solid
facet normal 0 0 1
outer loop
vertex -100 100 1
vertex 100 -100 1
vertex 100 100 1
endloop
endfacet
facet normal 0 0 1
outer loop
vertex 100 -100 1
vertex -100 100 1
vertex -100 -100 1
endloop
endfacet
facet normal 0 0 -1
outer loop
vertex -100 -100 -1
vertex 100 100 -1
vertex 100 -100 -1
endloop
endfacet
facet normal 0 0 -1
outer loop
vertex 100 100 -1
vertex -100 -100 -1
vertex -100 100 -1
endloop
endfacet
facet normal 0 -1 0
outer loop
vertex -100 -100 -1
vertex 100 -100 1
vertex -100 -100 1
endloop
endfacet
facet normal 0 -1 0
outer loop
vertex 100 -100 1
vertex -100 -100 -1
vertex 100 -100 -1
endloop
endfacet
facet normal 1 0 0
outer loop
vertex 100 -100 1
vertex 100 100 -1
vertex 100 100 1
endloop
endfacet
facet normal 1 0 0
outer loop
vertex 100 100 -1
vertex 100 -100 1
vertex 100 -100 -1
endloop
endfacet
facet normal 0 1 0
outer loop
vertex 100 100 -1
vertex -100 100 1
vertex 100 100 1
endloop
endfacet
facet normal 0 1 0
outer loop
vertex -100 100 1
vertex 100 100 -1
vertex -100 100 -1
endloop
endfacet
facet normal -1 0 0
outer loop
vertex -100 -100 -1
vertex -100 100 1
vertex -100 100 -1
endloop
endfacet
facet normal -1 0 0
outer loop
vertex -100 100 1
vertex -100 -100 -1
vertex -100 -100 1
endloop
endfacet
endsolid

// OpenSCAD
// Parameters
sheet_length = 200; //[100:400:1]
sheet_width  = 200; //[100:400:1]
sheet_thickness = 2; //[1:6:0.5]

// Robust, always-renderable thickness (avoid near-zero/blank renders)
t = max(sheet_thickness, 1);

// Geometry
module sheet_body() {
  cube([sheet_length, sheet_width, t], center=true);
}

// Final Output (one connected solid)
sheet_body();
